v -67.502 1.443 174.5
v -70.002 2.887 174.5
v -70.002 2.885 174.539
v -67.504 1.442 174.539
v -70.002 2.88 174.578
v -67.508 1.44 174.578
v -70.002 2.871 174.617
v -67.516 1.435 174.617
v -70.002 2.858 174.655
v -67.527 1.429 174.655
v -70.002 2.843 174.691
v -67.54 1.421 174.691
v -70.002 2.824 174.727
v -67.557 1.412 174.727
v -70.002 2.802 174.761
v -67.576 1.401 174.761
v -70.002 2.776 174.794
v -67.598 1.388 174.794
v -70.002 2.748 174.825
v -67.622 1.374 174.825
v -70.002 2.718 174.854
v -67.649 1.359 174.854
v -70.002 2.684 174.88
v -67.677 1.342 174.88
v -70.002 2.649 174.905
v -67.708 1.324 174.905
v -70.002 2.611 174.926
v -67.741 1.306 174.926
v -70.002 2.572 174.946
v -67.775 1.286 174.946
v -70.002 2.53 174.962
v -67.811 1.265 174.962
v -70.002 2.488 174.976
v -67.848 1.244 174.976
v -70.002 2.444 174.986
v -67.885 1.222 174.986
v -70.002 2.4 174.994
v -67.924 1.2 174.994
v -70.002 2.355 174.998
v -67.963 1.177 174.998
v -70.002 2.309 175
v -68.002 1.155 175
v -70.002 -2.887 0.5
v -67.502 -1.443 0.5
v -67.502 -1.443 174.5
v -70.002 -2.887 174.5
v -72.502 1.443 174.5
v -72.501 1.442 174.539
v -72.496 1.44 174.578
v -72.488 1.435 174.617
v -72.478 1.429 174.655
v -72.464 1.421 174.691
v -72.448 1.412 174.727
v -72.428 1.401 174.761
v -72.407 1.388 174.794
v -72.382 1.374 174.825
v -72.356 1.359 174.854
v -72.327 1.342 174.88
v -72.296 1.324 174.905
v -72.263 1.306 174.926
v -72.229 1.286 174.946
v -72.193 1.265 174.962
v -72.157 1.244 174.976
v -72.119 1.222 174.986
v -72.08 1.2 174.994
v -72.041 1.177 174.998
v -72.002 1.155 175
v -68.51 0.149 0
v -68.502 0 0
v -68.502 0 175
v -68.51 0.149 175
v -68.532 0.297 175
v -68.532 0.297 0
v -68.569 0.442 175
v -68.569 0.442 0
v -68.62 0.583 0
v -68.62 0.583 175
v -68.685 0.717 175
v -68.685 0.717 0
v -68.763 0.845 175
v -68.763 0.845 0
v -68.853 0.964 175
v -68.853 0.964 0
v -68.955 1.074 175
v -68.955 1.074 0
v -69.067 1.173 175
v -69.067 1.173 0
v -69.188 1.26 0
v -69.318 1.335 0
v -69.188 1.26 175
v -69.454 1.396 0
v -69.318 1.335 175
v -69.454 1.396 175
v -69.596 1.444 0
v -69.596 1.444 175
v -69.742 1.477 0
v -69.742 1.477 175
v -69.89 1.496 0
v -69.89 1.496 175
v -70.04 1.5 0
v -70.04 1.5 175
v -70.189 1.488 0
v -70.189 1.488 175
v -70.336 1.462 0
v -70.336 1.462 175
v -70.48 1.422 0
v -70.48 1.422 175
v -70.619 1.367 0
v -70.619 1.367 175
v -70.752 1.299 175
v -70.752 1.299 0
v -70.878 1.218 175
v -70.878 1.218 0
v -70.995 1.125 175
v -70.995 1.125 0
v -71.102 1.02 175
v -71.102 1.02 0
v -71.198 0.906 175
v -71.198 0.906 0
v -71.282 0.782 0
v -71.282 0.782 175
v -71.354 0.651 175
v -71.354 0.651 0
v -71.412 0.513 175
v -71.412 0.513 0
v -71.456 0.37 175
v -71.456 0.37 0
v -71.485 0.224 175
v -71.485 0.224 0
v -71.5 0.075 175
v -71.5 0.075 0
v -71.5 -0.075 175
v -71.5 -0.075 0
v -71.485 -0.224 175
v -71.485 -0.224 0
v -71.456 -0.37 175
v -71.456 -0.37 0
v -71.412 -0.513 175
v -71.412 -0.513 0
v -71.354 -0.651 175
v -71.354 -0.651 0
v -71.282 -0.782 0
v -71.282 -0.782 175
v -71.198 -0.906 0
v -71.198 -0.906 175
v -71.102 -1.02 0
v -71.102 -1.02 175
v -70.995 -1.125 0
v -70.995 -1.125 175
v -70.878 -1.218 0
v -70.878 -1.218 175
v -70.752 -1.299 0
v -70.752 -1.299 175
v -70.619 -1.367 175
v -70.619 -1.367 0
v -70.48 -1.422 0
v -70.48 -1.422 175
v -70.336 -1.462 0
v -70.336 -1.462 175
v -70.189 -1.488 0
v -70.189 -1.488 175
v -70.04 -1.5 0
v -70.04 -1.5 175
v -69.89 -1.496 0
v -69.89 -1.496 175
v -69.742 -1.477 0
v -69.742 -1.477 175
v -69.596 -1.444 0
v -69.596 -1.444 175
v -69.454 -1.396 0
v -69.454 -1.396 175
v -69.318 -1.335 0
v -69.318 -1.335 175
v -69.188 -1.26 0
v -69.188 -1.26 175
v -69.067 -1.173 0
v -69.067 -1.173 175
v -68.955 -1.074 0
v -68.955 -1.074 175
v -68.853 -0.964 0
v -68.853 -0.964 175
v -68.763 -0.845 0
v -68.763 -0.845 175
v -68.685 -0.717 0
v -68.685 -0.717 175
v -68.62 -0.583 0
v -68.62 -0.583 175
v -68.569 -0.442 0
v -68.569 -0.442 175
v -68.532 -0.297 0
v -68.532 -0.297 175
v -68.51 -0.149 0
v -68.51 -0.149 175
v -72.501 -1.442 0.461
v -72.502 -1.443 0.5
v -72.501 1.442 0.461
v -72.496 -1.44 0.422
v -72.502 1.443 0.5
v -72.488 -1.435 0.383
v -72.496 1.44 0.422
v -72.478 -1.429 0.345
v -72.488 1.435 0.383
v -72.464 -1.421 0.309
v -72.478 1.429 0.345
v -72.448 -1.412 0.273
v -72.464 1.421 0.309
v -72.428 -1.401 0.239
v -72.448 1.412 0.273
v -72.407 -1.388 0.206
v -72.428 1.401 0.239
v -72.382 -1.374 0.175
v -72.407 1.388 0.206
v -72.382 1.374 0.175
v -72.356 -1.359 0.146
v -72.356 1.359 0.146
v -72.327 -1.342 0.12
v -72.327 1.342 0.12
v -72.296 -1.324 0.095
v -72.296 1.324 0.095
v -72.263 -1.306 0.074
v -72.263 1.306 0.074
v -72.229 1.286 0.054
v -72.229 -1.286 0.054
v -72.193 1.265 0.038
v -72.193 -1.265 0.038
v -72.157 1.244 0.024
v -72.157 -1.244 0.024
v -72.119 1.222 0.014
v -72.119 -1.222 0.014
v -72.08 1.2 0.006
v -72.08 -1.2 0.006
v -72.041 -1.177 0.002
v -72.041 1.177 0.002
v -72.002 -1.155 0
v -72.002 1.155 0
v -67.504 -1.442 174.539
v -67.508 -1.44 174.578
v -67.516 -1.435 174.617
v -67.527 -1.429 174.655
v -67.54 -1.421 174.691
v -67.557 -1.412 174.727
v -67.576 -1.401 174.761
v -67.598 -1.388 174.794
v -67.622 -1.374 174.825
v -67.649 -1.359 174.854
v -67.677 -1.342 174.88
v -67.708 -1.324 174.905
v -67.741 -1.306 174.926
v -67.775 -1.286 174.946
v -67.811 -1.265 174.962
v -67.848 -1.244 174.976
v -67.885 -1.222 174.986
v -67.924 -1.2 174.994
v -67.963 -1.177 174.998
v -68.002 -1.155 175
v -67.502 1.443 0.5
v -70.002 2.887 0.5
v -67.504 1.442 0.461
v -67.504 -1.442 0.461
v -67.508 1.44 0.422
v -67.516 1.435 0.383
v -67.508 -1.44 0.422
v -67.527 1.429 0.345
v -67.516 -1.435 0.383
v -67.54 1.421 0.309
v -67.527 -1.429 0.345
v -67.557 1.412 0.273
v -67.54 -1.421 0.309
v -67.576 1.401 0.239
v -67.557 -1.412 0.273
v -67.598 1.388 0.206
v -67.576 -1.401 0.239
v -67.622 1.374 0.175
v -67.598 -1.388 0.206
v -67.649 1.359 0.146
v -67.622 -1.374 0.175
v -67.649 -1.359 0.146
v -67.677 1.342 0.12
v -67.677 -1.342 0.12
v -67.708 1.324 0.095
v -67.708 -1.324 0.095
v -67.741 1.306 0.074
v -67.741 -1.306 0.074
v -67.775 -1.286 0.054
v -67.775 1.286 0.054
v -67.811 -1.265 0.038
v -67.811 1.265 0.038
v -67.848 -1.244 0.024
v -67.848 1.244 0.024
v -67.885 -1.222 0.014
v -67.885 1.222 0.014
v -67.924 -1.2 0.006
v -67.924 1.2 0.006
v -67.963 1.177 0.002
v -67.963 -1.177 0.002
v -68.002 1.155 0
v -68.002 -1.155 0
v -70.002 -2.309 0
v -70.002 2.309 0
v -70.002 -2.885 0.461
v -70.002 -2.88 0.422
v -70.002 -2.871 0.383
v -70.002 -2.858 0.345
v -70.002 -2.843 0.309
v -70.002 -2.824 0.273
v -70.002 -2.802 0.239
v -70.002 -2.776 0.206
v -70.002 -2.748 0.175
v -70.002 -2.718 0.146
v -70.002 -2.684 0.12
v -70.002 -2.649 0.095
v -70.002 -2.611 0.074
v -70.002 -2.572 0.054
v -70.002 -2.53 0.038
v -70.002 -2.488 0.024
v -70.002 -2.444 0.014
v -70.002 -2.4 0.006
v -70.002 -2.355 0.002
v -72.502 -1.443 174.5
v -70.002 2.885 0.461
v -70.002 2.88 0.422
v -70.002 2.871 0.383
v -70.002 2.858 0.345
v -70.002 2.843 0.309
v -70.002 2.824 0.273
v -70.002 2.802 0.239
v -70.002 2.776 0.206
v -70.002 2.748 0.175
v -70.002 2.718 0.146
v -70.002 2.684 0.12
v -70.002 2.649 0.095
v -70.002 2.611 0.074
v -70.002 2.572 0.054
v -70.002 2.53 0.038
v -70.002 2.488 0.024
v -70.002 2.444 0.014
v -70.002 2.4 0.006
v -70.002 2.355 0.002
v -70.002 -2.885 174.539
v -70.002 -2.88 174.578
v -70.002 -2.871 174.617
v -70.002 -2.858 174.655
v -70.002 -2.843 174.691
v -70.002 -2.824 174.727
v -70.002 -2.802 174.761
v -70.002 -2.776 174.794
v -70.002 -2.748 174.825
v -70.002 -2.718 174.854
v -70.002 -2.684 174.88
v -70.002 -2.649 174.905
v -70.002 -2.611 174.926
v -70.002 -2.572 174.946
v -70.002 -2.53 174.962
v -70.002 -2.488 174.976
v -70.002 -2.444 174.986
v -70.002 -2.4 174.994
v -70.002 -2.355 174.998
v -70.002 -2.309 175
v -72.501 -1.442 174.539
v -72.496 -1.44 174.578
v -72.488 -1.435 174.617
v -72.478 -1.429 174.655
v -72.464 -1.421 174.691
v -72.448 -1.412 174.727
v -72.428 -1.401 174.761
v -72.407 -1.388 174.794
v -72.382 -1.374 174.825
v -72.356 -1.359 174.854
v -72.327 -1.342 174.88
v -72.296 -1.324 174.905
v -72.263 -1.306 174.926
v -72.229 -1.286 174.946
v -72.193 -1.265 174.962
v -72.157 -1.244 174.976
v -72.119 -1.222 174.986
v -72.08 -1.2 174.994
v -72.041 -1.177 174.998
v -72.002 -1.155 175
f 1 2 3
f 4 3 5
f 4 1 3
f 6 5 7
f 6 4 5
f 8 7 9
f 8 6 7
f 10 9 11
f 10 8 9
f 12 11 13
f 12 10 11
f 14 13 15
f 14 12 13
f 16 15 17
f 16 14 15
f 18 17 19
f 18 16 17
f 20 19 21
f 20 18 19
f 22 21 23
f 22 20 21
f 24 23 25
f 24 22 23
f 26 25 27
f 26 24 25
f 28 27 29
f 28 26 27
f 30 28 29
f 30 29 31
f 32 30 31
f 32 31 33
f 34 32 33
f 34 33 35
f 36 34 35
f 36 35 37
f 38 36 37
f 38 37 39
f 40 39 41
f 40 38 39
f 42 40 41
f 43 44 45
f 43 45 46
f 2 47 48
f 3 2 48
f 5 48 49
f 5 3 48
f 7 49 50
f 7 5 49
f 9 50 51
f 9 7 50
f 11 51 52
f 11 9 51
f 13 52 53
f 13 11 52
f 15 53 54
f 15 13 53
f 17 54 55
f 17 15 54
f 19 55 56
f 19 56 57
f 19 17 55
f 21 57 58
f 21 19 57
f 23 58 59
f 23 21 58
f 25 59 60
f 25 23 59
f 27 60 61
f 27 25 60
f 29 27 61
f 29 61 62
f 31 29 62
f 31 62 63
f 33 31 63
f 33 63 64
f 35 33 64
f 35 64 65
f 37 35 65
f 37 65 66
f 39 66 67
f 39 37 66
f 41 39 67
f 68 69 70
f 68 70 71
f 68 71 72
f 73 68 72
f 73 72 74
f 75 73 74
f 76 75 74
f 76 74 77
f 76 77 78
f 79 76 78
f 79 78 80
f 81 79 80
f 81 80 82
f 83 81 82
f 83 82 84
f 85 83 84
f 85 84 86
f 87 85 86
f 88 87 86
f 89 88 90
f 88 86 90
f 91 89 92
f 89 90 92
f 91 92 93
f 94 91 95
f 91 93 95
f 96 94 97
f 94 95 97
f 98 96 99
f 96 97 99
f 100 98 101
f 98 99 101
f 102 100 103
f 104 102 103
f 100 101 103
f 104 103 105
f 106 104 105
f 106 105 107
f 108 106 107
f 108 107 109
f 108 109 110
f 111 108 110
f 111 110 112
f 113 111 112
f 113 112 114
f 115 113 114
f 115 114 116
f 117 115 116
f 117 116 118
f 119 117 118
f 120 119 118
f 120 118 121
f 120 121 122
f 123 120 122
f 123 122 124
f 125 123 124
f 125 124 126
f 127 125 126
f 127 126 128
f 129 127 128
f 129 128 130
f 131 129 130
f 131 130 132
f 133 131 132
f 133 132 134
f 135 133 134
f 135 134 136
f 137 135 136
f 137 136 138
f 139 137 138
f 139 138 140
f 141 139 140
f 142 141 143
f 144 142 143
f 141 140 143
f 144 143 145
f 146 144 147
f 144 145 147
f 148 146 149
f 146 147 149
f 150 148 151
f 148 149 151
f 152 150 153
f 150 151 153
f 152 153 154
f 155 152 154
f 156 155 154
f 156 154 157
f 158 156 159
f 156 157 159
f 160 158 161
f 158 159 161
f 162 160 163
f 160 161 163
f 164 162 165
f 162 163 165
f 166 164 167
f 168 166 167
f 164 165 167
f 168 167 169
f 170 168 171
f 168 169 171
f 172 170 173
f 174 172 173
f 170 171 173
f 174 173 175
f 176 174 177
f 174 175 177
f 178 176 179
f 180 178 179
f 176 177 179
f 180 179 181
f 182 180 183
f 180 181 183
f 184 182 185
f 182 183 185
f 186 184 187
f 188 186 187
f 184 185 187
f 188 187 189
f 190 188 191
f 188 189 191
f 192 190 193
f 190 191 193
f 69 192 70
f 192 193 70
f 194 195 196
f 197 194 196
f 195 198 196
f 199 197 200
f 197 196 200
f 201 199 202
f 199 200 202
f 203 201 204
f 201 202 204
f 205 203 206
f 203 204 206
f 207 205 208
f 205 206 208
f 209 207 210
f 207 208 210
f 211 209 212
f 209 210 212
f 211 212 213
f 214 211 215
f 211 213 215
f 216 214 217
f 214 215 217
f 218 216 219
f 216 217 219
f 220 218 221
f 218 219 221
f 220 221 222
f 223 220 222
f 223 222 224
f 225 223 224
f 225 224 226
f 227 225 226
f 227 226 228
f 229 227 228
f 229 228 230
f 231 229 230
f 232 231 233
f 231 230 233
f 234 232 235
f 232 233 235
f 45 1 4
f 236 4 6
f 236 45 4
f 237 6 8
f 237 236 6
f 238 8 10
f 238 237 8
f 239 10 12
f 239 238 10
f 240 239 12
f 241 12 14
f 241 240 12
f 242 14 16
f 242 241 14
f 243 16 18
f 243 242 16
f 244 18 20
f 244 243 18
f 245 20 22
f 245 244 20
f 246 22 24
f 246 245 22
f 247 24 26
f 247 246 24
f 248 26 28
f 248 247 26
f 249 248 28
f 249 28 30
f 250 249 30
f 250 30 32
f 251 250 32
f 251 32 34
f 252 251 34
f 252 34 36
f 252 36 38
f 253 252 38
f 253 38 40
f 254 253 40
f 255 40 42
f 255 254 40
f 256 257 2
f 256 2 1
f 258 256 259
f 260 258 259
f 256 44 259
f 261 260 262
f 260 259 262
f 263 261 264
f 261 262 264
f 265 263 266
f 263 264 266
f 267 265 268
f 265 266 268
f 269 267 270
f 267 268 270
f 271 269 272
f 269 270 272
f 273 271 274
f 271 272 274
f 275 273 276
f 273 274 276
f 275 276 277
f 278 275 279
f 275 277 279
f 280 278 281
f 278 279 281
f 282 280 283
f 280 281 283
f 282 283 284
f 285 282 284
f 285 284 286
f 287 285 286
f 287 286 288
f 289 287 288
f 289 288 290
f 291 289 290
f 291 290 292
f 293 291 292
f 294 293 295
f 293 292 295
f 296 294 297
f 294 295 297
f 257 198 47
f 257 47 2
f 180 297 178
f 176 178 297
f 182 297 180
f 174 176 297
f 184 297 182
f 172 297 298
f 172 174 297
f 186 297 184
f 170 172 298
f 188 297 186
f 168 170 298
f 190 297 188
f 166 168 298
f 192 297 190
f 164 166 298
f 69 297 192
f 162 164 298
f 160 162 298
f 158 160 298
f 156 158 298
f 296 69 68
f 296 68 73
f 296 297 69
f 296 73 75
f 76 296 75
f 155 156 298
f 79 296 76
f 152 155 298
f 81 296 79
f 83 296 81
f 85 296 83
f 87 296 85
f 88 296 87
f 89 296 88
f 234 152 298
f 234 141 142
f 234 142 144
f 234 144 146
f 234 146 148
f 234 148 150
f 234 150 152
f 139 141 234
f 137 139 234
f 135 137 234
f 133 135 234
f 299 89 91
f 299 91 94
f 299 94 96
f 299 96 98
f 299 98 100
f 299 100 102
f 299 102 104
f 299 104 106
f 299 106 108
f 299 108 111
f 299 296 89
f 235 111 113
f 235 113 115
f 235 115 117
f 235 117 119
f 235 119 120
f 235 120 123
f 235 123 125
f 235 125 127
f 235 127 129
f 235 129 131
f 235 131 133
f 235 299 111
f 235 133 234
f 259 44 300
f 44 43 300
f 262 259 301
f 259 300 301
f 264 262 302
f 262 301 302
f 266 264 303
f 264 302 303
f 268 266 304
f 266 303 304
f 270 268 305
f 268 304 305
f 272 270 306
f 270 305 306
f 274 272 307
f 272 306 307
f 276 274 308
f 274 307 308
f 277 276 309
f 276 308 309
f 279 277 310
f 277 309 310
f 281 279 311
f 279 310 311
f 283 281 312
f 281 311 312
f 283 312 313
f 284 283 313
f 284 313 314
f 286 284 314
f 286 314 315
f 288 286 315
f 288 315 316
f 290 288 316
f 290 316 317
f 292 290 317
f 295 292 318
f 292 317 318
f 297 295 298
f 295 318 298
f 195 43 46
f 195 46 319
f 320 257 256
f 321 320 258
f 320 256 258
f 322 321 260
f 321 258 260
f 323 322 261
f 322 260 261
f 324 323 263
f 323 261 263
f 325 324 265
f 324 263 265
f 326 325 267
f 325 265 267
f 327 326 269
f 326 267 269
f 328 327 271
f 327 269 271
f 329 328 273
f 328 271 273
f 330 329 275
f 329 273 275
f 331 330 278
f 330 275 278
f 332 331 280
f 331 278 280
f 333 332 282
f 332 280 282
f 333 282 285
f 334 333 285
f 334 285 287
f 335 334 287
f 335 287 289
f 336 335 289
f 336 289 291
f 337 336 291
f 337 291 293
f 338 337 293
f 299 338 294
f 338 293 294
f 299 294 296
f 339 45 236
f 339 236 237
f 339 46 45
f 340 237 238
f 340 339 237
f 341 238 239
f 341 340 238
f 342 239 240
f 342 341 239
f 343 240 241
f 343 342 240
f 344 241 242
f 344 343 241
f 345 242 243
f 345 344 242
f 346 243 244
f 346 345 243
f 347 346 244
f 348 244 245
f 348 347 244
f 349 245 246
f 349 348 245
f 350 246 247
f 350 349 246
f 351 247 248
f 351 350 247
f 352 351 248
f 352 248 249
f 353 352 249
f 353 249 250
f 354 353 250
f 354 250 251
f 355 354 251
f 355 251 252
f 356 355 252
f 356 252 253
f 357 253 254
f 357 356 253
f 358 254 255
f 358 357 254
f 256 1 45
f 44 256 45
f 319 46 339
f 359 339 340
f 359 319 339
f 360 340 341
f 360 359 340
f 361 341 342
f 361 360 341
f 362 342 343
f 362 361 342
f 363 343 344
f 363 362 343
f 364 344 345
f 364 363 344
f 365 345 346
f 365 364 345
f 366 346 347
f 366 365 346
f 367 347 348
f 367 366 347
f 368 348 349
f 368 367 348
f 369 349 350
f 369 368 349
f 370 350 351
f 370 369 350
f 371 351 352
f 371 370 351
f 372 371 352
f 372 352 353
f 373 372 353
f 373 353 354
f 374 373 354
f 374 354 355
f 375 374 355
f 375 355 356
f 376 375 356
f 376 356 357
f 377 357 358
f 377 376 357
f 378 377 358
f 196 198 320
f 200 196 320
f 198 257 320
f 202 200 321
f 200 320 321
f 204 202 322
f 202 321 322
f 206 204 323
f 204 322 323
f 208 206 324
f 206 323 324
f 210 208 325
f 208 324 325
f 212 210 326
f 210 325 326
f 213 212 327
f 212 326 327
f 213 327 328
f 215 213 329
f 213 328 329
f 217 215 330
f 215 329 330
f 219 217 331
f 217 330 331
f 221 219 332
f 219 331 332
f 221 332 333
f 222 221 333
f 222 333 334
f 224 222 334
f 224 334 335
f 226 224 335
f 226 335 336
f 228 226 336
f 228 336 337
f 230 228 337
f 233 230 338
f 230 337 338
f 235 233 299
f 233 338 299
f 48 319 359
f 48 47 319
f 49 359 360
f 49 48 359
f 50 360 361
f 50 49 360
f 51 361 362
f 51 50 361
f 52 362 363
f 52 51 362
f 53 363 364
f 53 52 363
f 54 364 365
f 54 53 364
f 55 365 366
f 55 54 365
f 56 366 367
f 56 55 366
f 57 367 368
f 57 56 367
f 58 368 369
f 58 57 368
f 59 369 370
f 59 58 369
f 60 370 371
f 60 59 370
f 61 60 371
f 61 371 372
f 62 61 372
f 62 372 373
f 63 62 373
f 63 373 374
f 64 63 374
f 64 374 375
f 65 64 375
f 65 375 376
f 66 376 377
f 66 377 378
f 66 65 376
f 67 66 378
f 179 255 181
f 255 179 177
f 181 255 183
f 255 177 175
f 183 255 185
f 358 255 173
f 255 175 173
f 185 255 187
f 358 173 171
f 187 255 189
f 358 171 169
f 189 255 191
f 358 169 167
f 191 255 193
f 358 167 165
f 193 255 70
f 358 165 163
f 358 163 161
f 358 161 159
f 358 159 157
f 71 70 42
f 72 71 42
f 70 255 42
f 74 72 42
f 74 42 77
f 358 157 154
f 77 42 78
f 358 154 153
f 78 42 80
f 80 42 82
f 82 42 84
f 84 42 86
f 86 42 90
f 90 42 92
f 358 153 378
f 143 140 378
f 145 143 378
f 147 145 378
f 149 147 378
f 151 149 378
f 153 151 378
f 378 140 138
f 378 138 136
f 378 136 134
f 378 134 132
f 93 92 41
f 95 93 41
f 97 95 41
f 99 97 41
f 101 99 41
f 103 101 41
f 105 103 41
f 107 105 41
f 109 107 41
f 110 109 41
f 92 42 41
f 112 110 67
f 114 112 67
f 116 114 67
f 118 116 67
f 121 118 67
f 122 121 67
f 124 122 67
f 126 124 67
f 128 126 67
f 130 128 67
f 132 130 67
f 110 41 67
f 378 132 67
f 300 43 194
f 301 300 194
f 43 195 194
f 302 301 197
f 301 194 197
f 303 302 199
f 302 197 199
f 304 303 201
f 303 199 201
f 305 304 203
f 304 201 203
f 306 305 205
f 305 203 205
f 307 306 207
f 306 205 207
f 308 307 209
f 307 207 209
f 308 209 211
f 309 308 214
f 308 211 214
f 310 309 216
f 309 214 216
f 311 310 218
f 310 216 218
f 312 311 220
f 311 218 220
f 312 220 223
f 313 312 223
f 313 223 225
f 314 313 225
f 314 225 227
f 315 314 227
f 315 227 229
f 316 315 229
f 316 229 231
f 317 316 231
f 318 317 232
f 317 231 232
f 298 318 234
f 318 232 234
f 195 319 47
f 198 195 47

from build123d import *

# Parameters (mm, degrees)
RESSALTO_EXTRUS_O1_DEPTH = 175
FILETE1_R                = 0.5
ESBO_O2_R                = 1.5
CORTE_EXTRUS_O1_DEPTH    = 190.446275038


with BuildPart() as part:
    # Esboço1 → Ressalto-extrusão1 (new body)
    with BuildSketch(Plane(origin=(0, 0, 0), x_dir=(-1, 0, 0), z_dir=(0, 0, -1))):
        Polygon((67.502122675, -1.443375673), (70.002122675, -2.886751346), (72.502122675, -1.443375673), (72.502122675, 1.443375673), (70.002122675, 2.886751346), (67.502122675, 1.443375673), align=None)
    extrude(amount=-RESSALTO_EXTRUS_O1_DEPTH)

    # Filete1
    filete1_edges = [part.edges().sort_by_distance(p)[0] for p in [
        (-71.252122675, -2.165063509, 175),
        (-72.502122675, 0, 175),
        (-71.252122675, 2.165063509, 175),
        (-68.752122675, 2.165063509, 175),
        (-67.502122675, 0, 175),
        (-68.752122675, 2.165063509, 0),
        (-71.252122675, 2.165063509, 0),
        (-72.502122675, 0, 0),
        (-71.252122675, -2.165063509, 0),
        (-68.752122675, -2.165063509, 0),
        (-67.502122675, 0, 0),
        (-68.752122675, -2.165063509, 175),
    ]]
    fillet(filete1_edges, radius=FILETE1_R)

    # Esboço2 → Corte-extrusão1 (cut, through all)
    with BuildSketch(Plane.XY.offset(175)):
        with Locations((-70.002122675, 0)):
            Circle(ESBO_O2_R)
    extrude(amount=-CORTE_EXTRUS_O1_DEPTH, mode=Mode.SUBTRACT)


solid = part.part
